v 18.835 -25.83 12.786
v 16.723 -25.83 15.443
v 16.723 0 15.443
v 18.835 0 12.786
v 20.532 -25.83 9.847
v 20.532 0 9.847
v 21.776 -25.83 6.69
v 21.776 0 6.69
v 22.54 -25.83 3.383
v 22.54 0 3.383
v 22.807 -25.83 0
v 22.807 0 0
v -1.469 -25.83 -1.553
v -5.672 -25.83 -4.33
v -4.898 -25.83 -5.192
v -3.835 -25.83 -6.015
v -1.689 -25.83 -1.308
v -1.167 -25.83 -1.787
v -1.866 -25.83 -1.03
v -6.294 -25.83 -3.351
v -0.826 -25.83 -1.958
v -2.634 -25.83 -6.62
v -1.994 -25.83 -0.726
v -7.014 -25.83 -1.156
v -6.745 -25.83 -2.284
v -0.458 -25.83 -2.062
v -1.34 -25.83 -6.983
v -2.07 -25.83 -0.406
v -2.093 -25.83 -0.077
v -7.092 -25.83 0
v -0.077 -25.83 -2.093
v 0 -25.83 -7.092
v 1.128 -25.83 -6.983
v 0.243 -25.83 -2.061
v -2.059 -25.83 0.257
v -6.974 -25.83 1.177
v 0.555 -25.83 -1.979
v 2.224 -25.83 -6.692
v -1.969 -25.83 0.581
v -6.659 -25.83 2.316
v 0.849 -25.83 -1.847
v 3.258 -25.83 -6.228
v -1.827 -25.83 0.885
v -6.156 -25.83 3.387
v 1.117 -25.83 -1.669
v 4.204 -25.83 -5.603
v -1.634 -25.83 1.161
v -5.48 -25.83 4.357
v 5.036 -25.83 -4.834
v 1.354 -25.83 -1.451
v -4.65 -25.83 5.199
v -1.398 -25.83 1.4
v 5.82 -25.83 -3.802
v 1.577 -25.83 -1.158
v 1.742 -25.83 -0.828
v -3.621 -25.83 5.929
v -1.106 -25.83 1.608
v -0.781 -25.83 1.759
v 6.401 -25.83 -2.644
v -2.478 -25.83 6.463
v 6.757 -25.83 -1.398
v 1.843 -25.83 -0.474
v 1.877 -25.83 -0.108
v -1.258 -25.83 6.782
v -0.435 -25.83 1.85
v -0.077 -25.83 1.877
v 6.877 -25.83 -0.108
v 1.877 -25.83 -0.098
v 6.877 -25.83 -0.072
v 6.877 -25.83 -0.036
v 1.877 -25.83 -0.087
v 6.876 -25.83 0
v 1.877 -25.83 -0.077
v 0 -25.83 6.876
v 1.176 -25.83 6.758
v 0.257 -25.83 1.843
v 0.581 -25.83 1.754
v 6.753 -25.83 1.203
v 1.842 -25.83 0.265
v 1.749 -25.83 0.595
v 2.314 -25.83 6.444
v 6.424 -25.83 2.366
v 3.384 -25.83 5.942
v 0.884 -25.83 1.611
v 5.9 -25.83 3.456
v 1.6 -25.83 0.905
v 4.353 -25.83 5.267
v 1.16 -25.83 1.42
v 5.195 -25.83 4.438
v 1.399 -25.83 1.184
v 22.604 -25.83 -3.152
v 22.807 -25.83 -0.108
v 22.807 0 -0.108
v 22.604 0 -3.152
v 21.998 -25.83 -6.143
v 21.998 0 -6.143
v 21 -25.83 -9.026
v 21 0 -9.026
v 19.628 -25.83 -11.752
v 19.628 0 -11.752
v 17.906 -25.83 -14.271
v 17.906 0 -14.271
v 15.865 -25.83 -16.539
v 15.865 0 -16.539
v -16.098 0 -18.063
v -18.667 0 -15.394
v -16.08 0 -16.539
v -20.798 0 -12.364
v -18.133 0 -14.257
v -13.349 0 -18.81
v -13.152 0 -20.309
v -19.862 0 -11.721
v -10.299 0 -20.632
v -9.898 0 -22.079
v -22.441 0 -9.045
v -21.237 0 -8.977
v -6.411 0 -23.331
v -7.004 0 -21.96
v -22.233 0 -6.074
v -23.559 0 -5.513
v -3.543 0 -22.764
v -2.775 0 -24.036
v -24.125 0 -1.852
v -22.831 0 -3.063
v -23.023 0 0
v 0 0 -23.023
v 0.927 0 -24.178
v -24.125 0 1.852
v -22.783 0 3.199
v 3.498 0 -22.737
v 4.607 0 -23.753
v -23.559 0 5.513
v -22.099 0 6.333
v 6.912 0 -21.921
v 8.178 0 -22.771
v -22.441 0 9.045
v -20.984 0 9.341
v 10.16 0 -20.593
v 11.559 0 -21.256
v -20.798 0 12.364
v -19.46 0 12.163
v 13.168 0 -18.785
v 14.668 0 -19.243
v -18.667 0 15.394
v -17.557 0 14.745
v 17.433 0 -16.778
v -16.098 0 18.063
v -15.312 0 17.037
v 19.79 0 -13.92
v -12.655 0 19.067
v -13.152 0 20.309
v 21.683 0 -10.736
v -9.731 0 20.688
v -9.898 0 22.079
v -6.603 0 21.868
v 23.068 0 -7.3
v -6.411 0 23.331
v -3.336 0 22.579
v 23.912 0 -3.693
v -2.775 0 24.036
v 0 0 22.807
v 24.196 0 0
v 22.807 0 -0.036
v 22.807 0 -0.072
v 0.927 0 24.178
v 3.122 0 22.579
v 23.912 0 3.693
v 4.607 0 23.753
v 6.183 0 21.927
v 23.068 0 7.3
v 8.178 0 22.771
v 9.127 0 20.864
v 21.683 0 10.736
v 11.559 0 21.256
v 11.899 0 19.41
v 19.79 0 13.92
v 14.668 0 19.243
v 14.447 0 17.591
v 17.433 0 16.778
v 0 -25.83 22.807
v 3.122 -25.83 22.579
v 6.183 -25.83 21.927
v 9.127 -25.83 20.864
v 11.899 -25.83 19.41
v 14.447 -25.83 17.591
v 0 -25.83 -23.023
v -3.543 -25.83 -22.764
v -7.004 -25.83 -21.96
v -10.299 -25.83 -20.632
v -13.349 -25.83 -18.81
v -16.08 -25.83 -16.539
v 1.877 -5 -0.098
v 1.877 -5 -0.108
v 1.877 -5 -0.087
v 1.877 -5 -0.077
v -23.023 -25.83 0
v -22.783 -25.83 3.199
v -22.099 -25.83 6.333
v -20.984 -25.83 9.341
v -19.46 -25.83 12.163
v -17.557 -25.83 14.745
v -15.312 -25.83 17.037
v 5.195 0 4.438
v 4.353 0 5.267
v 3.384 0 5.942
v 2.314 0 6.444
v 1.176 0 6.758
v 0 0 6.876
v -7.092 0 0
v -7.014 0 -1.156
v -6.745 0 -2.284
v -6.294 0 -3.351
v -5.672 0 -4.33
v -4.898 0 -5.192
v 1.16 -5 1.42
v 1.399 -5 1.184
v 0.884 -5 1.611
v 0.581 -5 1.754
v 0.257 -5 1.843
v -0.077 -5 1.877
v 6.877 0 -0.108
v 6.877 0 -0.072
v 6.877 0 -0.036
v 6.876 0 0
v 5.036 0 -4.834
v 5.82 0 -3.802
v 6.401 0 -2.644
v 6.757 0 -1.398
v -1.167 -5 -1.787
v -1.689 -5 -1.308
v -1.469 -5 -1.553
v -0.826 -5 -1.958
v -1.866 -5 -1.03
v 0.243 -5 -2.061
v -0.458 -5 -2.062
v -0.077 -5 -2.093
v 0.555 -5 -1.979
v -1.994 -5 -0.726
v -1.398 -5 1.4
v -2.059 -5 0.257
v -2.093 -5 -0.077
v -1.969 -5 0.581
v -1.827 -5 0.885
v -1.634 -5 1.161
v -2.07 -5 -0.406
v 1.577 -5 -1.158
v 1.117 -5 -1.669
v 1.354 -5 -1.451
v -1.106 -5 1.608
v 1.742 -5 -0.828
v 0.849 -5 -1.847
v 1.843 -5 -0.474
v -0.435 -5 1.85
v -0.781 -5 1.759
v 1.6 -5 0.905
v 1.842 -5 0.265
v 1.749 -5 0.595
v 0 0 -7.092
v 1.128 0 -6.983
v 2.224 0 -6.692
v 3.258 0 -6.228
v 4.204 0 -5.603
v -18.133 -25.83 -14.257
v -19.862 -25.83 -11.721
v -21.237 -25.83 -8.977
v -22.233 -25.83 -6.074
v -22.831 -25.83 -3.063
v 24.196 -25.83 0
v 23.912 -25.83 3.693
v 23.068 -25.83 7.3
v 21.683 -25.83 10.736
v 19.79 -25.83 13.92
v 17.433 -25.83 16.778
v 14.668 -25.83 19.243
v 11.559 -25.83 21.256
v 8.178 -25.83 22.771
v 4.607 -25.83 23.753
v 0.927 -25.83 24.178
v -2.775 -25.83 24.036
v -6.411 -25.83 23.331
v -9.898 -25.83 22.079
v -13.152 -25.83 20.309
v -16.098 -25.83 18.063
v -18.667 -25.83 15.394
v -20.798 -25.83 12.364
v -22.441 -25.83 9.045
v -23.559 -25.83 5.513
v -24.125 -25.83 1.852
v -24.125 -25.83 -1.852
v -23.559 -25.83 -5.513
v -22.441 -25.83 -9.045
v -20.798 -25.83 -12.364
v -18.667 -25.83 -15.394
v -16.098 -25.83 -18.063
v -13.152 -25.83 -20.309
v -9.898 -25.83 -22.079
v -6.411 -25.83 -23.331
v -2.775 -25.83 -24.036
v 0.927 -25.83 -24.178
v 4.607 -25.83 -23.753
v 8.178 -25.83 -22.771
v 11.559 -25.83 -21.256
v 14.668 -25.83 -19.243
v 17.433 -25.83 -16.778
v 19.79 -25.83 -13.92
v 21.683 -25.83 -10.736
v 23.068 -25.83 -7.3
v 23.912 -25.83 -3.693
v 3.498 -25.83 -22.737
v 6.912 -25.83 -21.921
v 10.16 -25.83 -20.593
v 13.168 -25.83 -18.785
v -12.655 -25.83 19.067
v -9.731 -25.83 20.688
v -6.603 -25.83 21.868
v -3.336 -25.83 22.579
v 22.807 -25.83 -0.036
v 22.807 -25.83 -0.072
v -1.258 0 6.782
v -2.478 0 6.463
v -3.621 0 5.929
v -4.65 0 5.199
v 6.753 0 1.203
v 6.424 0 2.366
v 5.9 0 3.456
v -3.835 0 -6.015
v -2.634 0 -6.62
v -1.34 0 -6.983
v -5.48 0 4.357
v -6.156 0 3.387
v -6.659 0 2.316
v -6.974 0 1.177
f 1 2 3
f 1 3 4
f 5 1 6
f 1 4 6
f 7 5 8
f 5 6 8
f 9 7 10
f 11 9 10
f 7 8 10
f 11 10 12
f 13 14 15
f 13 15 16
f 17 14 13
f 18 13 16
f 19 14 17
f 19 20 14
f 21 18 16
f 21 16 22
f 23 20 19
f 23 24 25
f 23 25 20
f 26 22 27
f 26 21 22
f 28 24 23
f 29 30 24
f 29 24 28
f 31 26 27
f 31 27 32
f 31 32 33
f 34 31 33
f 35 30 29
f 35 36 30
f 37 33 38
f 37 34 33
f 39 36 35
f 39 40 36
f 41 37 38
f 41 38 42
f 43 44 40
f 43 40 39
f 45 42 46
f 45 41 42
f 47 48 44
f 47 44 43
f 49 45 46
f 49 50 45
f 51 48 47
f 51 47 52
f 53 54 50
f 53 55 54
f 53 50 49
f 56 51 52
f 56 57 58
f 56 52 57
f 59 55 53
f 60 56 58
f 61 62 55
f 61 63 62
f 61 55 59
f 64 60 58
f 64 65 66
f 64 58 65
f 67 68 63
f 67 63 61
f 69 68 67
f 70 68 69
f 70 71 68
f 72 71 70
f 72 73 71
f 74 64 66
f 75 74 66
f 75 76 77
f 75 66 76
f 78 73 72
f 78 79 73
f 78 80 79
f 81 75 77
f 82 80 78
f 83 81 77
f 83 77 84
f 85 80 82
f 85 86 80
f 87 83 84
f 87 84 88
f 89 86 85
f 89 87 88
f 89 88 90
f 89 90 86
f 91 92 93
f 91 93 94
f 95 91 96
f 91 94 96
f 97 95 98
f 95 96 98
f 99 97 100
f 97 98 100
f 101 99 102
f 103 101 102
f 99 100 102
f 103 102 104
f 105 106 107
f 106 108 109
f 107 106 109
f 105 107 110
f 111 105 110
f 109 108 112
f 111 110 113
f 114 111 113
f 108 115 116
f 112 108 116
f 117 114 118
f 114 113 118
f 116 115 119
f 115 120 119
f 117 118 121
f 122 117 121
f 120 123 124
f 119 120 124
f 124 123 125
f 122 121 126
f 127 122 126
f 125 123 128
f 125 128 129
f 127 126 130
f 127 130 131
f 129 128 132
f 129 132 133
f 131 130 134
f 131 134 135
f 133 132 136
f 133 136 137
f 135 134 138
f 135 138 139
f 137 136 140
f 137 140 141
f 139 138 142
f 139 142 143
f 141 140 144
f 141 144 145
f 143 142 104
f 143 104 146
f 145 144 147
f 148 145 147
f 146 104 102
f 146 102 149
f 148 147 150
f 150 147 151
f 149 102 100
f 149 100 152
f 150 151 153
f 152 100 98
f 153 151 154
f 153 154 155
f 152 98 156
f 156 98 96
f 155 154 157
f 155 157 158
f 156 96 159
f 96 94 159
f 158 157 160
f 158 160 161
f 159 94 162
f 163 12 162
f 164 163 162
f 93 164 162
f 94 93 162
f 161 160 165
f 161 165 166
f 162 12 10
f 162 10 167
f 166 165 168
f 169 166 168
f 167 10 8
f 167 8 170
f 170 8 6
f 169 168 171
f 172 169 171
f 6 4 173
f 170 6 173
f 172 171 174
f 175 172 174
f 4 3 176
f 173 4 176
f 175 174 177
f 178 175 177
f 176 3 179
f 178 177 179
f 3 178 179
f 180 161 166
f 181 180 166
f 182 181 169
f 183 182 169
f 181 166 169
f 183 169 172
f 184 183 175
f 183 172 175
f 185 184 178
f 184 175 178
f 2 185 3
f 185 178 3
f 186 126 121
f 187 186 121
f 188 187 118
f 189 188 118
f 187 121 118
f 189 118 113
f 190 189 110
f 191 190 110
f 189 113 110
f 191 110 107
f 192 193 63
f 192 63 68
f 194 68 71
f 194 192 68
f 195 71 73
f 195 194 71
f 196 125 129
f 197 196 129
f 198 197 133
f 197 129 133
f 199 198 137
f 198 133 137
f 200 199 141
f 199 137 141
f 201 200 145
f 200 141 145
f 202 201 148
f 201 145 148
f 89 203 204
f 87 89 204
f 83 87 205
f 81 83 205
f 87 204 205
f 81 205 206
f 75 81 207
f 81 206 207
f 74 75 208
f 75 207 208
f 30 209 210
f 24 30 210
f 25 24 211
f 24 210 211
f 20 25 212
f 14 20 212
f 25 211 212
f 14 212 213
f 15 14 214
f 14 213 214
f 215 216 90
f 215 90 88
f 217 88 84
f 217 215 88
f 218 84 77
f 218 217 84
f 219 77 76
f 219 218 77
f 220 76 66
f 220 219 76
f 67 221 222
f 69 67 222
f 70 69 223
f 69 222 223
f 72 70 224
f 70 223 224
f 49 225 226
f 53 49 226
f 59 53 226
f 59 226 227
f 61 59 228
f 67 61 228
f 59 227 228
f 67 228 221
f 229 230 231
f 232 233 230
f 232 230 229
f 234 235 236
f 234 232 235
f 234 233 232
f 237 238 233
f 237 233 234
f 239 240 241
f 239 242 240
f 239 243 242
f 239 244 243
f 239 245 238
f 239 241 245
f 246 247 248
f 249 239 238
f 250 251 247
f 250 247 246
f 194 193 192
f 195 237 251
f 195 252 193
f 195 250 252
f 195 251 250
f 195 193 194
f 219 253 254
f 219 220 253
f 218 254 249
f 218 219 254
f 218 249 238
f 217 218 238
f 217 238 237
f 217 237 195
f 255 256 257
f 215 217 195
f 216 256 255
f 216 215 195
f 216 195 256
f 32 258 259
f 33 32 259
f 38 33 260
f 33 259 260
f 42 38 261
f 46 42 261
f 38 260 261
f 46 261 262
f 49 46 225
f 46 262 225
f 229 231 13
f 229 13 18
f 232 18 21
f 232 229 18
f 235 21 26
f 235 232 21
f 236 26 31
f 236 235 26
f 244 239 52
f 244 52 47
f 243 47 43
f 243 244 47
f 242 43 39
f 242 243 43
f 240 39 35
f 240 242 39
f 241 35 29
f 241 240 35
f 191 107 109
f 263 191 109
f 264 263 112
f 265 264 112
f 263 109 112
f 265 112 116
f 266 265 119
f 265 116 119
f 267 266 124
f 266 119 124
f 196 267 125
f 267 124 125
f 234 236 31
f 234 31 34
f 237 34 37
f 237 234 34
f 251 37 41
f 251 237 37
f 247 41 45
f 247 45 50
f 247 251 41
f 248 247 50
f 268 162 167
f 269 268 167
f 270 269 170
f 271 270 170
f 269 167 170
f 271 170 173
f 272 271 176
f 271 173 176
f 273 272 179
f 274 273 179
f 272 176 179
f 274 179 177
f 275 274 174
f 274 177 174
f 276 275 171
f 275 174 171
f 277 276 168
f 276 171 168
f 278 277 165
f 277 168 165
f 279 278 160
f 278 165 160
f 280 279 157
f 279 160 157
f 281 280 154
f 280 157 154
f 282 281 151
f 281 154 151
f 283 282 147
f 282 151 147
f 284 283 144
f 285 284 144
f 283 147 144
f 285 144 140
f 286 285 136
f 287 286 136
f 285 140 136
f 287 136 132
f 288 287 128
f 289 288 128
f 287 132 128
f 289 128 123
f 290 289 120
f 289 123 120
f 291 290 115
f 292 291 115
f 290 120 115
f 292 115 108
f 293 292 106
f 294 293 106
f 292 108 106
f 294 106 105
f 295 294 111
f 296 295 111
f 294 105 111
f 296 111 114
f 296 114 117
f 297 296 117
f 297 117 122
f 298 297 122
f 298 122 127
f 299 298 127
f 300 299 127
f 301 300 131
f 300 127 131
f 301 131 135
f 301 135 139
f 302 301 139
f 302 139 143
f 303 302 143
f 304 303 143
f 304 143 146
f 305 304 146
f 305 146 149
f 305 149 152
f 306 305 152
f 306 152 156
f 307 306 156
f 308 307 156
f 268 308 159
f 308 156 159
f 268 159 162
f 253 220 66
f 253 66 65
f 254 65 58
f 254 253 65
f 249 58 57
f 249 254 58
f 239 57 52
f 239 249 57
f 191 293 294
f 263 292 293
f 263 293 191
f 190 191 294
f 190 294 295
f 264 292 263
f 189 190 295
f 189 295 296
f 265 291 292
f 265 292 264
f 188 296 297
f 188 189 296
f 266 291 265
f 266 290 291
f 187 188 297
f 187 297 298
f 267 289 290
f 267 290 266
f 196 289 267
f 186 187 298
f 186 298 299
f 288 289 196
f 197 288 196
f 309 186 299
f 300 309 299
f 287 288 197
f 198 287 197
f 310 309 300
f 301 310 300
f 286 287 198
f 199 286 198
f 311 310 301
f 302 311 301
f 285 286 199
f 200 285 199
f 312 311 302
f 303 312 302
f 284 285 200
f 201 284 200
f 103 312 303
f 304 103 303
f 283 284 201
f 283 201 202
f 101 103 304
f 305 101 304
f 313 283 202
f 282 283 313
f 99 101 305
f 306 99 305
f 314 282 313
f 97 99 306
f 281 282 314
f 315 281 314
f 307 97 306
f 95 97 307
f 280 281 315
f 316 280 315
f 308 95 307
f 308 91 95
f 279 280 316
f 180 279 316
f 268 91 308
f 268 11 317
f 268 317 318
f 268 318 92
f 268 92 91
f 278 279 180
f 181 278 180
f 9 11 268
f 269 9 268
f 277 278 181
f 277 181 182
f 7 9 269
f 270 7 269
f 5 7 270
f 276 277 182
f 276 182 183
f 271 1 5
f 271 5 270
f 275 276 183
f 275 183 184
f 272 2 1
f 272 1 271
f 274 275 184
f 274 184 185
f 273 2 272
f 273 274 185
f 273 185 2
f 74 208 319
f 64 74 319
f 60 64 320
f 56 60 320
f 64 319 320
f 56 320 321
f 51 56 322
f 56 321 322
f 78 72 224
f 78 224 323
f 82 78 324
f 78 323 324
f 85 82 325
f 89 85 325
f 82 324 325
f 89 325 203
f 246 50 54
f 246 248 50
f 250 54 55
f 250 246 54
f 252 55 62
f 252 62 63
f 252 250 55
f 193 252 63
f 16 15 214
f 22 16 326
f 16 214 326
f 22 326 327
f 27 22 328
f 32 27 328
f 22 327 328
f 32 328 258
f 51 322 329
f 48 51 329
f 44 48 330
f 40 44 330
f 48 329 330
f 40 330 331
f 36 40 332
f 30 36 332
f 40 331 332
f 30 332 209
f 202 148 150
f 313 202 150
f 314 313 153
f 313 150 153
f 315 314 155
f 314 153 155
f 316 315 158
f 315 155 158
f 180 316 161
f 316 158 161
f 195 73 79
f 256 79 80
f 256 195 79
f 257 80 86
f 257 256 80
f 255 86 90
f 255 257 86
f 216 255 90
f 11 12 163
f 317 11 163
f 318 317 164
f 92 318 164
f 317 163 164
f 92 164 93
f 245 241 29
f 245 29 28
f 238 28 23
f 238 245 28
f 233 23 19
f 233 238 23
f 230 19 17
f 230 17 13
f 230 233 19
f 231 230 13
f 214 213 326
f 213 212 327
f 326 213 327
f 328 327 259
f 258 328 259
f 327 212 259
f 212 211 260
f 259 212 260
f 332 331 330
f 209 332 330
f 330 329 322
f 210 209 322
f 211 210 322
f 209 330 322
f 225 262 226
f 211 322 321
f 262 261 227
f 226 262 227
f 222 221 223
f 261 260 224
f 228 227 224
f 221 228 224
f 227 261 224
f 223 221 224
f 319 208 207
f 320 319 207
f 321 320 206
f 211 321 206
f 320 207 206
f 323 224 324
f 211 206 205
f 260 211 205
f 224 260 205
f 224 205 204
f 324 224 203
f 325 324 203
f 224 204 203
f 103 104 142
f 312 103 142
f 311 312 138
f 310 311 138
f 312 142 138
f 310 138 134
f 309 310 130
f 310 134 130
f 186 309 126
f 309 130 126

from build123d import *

# Parameters (mm, degrees)
F0_R     = 24.1955282069
F1_DEPTH = 25.83
F2_DEPTH = 25.83
F3_T     = -5


with BuildPart() as f1:
    # F0 (on Front) → F1 (new body)
    with BuildSketch(Plane.XZ):
        Circle(F0_R)
        with BuildLine():
            ThreePointArc((22.8069805174, 0), (22.8071705652, -0.0538819661), (22.8072339146, -0.1077642301))
            ThreePointArc((22.8072339146, -0.1077642301), (21.0003923413, -9.0264453451), (15.8648055636, -16.5386552563))
            ThreePointArc((15.8648055636, -16.5386552563), (8.5613983016, -21.3196197319), (0, -23.0225108241))
            ThreePointArc((0, -23.0225108241), (-8.6770781727, -21.360155045), (-16.0803377344, -16.5386552563))
            ThreePointArc((-16.0803377344, -16.5386552563), (-21.2368375186, -8.976787027), (-23.0225126882, 0))
            ThreePointArc((-23.0225126882, 0), (-20.9842018201, 9.3406036721), (-15.3120127095, 17.0365674745))
            ThreePointArc((-15.3120127095, 17.0365674745), (-8.1886294776, 21.3351103869), (0, 22.806982364))
            ThreePointArc((0, 22.806982364), (9.1274296662, 20.863844779), (16.7232305874, 15.4426304916))
            ThreePointArc((16.7232305874, 15.4426304916), (21.212405965, 8.2914910192), (22.8069805174, 0))
        make_face(mode=Mode.SUBTRACT)
    extrude(amount=F1_DEPTH)


with BuildPart() as f2:
    # F0 (on Front) → F2 (new body)
    with BuildSketch(Plane.XZ):
        with BuildLine():
            ThreePointArc((6.8772339146, -0.1077642301), (6.8770260765, -0.0538805117), (6.8764025745, 0))
            ThreePointArc((6.8764025745, 0), (6.4244277946, 2.3662341762), (5.1954822758, 4.4381990143))
            ThreePointArc((5.1954822758, 4.4381990143), (2.8597211871, 6.2155453691), (0, 6.8764044013))
            ThreePointArc((0, 6.8764044013), (-2.4781125568, 6.4627519297), (-4.6495656756, 5.1990503967))
            ThreePointArc((-4.6495656756, 5.1990503967), (-6.4299110761, 2.862203399), (-7.0919347454, 0))
            ThreePointArc((-7.0919347454, 0), (-6.5417201535, -2.827039878), (-4.8976605359, -5.191772113))
            ThreePointArc((-4.8976605359, -5.191772113), (-2.6342724132, -6.6198292463), (0, -7.0919328614))
            ThreePointArc((0, -7.0919328614), (2.7504465149, -6.481212726), (5.0358755768, -4.8335631521))
            ThreePointArc((5.0358755768, -4.8335631521), (6.400634717, -2.6436948275), (6.8772339146, -0.1077642301))
        make_face()
    extrude(amount=F2_DEPTH)

    # F3
    f3_openings = [f2.faces().sort_by_distance(p)[0] for p in [
        (-0.107766, -25.83, -0.107764),
    ]]
    offset(amount=F3_T, openings=f3_openings)


solid = Compound([f1.part, f2.part])
